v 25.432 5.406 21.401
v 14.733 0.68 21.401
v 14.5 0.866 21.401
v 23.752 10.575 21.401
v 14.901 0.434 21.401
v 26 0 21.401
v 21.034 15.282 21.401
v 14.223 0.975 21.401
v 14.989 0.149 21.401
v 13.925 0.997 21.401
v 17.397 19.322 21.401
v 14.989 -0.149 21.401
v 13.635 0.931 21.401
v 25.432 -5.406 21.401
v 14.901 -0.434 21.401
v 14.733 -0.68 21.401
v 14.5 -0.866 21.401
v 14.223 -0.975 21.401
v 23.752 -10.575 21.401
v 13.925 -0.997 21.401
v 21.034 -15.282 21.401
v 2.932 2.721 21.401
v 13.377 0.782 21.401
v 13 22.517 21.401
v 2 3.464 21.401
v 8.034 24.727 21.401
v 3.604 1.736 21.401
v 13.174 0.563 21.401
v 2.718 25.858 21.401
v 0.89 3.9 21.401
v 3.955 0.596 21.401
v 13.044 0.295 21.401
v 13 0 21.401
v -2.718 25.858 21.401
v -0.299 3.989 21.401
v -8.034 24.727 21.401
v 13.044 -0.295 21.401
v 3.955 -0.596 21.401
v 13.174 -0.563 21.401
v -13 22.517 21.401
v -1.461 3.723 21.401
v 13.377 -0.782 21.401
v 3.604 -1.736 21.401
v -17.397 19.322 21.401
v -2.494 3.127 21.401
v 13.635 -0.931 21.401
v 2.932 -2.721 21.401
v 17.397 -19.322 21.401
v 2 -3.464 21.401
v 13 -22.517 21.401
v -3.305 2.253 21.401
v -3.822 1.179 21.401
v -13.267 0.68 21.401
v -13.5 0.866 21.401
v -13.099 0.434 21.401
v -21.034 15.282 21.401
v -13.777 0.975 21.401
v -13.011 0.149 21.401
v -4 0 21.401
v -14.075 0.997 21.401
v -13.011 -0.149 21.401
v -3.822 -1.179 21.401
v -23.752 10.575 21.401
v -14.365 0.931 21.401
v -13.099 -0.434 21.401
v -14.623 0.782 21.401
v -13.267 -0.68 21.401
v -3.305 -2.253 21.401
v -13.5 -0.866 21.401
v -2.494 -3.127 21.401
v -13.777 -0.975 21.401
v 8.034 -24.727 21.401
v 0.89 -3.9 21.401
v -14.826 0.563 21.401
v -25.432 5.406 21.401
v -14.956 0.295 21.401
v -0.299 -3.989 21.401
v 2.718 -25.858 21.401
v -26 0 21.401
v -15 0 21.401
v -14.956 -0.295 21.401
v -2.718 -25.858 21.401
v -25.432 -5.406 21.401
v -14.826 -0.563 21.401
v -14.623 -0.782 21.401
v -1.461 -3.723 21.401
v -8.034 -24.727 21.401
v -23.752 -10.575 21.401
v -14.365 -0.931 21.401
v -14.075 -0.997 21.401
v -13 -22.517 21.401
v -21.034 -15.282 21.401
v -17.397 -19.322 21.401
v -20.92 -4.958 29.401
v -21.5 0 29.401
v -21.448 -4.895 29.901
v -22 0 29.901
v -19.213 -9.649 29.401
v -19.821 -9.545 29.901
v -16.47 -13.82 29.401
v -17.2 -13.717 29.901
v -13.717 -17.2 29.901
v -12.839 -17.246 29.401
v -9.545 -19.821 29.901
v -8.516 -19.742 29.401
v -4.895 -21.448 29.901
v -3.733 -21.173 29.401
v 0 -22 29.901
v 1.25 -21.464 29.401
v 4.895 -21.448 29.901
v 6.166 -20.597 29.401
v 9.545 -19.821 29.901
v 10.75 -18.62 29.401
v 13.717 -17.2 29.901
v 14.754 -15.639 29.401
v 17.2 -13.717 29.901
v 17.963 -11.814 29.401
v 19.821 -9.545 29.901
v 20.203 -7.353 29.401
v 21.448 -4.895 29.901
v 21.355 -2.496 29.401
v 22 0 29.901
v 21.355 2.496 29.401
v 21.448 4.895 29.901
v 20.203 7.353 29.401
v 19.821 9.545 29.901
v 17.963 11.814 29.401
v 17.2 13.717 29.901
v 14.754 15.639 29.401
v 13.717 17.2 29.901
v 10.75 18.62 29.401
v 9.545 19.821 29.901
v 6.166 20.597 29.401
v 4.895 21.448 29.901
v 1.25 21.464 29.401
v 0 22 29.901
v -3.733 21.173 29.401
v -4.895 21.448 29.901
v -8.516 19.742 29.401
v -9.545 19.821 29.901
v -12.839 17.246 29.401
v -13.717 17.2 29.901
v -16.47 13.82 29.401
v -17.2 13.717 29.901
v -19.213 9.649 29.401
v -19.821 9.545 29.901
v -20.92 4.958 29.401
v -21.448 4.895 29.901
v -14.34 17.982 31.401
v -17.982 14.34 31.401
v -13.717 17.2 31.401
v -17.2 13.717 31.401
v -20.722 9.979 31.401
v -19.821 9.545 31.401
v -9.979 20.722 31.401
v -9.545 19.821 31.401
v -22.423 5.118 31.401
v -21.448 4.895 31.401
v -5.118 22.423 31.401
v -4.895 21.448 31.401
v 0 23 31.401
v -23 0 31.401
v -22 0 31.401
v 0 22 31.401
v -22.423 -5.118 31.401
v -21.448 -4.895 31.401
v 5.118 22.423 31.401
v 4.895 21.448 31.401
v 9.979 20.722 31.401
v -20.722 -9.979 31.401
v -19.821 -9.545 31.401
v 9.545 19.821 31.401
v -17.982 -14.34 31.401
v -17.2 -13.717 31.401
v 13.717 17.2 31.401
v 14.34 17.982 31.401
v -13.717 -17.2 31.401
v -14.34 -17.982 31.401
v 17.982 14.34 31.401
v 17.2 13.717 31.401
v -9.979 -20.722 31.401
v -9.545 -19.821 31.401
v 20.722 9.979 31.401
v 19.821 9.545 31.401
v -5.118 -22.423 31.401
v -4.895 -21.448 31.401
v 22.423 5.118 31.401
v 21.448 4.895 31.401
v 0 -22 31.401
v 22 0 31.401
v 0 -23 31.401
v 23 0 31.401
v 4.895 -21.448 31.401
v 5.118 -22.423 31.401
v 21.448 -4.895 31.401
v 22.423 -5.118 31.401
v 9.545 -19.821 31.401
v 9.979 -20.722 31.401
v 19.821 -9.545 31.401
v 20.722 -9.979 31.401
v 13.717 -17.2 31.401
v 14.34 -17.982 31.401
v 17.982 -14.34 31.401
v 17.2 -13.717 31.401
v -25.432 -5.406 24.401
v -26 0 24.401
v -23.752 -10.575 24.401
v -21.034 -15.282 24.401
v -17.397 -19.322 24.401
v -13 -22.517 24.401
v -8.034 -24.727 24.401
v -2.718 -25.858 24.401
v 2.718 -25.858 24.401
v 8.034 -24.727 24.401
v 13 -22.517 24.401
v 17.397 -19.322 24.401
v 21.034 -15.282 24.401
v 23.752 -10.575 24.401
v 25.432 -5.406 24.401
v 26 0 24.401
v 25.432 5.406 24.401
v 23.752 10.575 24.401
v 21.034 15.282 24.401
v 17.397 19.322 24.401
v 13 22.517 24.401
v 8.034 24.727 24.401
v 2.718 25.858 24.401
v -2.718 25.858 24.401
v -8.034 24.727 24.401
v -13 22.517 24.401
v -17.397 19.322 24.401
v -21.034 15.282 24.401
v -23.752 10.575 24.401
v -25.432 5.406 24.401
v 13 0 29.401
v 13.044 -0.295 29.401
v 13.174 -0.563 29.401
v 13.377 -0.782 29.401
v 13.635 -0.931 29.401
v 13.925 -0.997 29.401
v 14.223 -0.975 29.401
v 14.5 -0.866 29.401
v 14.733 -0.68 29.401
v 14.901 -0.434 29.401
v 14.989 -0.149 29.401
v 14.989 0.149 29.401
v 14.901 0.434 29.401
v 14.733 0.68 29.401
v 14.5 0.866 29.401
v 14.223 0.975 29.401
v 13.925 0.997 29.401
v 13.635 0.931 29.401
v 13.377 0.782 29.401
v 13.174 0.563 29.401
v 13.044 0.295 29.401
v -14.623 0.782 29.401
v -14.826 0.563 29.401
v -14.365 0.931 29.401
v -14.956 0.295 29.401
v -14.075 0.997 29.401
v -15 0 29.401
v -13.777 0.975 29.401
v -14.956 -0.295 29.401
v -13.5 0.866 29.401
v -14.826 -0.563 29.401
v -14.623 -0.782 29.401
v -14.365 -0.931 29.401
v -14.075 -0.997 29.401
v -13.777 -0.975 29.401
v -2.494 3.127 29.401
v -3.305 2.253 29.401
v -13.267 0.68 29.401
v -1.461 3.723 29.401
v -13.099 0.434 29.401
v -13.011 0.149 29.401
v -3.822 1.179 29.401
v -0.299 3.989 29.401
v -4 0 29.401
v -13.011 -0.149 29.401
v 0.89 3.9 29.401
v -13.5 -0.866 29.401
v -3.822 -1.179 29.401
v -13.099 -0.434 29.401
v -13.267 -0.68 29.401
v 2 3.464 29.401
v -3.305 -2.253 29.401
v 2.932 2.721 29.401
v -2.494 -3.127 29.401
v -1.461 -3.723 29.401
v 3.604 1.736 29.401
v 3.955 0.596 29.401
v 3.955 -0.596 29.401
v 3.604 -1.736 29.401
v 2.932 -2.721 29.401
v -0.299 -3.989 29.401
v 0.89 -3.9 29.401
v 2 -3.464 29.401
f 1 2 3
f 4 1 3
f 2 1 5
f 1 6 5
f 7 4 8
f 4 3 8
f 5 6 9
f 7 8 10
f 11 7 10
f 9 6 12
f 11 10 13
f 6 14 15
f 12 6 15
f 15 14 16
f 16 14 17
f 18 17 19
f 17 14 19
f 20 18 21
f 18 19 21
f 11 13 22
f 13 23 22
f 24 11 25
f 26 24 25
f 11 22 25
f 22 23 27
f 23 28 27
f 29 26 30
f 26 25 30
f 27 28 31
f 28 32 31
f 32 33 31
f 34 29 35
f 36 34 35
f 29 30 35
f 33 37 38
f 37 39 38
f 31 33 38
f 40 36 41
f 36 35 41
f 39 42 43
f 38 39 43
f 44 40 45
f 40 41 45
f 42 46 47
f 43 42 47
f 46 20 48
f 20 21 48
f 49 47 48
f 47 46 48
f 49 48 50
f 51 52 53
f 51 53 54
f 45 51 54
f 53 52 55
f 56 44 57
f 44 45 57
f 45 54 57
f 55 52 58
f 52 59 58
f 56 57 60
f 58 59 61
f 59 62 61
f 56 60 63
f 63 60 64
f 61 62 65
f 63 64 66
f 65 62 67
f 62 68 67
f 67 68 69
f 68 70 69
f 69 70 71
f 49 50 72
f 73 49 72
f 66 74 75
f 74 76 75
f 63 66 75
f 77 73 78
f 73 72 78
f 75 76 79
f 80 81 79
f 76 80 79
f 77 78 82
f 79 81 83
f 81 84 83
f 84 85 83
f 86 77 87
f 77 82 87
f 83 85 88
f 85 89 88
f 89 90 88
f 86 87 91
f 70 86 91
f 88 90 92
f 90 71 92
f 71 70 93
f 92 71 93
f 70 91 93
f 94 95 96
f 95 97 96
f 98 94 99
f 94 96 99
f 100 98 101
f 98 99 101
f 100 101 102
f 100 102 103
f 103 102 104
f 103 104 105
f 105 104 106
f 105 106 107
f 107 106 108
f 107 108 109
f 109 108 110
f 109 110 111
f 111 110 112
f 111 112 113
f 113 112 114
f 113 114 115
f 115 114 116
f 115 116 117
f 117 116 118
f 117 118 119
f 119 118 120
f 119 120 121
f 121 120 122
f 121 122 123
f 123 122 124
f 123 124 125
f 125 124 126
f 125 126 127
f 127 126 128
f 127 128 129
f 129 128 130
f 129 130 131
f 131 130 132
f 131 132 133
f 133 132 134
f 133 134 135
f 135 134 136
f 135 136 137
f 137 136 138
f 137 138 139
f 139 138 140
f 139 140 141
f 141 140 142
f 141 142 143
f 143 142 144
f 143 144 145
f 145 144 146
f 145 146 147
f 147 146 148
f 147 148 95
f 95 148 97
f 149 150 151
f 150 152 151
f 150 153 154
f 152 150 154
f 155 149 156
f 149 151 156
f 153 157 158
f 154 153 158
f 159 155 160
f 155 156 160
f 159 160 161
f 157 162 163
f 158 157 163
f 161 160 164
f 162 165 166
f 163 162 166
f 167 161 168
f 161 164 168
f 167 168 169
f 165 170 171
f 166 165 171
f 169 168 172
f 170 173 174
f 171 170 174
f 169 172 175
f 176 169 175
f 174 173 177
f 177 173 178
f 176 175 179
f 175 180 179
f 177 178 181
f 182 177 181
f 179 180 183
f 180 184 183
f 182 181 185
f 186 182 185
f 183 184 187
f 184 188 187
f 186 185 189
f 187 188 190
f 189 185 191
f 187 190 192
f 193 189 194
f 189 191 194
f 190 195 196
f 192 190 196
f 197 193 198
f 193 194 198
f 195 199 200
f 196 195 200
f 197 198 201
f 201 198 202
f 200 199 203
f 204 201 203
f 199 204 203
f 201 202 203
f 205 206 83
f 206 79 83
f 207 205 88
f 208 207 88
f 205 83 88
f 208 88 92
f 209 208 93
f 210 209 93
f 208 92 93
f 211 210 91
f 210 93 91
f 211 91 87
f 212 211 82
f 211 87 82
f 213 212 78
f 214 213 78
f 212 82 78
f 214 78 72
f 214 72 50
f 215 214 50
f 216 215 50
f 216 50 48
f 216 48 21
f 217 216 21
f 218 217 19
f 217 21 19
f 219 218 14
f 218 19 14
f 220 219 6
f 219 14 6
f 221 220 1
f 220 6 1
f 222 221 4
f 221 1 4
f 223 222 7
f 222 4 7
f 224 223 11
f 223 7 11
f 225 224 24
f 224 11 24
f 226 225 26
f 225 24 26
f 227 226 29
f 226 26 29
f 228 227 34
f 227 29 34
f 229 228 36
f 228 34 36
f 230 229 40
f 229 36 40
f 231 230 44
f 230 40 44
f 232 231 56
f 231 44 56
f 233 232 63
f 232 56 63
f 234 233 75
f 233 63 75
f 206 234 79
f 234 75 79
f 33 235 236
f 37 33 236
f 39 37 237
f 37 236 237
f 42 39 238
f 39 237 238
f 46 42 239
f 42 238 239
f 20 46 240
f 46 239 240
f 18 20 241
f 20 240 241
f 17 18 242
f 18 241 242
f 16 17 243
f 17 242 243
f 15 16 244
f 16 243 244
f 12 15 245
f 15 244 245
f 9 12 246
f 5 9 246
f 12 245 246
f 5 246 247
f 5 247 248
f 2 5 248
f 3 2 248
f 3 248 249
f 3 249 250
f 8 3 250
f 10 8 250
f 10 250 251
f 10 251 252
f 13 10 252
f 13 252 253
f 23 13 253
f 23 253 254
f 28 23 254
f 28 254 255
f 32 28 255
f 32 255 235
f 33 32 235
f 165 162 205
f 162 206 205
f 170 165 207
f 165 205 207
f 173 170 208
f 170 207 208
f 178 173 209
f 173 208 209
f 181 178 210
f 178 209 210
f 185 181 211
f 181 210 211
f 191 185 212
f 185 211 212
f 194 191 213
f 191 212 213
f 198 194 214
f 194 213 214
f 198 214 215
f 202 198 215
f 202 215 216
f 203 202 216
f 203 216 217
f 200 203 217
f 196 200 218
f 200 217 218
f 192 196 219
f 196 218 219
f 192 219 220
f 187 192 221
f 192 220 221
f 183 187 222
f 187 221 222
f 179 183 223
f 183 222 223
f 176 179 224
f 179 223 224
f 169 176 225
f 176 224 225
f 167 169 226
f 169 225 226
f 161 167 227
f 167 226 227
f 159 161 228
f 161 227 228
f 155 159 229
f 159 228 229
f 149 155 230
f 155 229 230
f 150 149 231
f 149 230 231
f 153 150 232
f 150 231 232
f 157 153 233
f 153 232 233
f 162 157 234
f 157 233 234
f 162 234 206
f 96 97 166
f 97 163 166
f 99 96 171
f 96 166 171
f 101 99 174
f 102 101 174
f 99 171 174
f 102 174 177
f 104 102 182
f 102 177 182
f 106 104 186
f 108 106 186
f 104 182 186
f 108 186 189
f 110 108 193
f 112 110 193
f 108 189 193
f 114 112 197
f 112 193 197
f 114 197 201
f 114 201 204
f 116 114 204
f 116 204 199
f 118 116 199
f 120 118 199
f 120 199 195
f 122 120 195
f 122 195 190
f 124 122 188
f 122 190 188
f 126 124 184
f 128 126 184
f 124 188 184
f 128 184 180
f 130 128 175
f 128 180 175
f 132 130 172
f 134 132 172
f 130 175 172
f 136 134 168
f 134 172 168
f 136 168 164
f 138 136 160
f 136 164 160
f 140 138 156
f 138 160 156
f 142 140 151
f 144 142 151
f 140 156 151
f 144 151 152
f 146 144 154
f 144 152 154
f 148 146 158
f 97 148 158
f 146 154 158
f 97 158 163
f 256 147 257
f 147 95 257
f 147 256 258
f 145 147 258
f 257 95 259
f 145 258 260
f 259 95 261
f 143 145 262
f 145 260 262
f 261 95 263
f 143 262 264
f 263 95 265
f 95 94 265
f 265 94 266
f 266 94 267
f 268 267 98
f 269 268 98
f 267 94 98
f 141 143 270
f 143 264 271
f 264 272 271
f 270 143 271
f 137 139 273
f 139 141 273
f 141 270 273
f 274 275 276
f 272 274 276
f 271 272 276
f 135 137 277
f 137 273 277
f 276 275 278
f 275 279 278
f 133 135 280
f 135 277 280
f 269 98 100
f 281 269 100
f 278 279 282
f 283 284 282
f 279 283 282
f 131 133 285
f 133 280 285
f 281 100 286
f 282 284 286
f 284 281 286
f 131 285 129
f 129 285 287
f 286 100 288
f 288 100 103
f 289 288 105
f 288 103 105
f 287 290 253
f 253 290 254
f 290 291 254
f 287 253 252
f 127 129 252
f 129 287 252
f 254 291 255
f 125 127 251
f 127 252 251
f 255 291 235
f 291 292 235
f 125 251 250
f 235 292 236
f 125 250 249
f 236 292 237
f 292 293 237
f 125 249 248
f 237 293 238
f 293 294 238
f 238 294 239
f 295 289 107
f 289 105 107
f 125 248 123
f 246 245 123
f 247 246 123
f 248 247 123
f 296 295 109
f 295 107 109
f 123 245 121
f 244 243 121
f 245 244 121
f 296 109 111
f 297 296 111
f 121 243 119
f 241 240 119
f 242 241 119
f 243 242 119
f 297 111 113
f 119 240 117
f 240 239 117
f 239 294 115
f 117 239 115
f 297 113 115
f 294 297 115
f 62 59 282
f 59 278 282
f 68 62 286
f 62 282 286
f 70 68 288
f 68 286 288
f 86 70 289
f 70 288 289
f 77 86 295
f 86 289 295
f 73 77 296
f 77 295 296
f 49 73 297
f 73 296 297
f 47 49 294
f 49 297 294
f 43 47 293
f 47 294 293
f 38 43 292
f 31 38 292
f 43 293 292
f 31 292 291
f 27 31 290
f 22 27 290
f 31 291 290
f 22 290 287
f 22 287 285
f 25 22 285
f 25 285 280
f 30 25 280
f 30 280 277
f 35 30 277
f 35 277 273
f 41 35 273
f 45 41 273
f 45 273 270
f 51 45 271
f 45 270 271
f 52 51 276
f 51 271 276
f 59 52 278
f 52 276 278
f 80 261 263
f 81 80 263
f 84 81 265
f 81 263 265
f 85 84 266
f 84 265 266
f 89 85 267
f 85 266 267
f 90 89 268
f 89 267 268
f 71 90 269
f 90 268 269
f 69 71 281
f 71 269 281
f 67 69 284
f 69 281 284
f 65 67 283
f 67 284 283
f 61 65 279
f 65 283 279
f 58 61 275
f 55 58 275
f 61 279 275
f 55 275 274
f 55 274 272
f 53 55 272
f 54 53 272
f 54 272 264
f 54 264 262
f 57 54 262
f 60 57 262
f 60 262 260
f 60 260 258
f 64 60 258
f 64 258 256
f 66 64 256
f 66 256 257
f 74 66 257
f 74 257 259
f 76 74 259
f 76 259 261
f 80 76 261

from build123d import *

# Parameters (mm, degrees)
F3_D = 2


with BuildPart() as f1:
    # F0 (on Front) → F1 (revolve)
    with BuildSketch(Plane.XZ):
        Polygon((-26, 21.401275), (-4, 21.401275), (-4, 29.401275), (-21.5, 29.401275), (-22, 29.901275), (-22, 31.401275), (-23, 31.401275), (-26, 24.401275), align=None)
    revolve(axis=Axis((0, 0, 25.401275), (0, 0, 1)))

    # F3 (through all)
    with Locations(Plane(origin=(0, 0, 21.401275), x_dir=(1, 0, 0), z_dir=(0, 0, -1))):
        with Locations((-14, 0), (14, 0)):
            Hole(F3_D / 2)


solid = f1.part
